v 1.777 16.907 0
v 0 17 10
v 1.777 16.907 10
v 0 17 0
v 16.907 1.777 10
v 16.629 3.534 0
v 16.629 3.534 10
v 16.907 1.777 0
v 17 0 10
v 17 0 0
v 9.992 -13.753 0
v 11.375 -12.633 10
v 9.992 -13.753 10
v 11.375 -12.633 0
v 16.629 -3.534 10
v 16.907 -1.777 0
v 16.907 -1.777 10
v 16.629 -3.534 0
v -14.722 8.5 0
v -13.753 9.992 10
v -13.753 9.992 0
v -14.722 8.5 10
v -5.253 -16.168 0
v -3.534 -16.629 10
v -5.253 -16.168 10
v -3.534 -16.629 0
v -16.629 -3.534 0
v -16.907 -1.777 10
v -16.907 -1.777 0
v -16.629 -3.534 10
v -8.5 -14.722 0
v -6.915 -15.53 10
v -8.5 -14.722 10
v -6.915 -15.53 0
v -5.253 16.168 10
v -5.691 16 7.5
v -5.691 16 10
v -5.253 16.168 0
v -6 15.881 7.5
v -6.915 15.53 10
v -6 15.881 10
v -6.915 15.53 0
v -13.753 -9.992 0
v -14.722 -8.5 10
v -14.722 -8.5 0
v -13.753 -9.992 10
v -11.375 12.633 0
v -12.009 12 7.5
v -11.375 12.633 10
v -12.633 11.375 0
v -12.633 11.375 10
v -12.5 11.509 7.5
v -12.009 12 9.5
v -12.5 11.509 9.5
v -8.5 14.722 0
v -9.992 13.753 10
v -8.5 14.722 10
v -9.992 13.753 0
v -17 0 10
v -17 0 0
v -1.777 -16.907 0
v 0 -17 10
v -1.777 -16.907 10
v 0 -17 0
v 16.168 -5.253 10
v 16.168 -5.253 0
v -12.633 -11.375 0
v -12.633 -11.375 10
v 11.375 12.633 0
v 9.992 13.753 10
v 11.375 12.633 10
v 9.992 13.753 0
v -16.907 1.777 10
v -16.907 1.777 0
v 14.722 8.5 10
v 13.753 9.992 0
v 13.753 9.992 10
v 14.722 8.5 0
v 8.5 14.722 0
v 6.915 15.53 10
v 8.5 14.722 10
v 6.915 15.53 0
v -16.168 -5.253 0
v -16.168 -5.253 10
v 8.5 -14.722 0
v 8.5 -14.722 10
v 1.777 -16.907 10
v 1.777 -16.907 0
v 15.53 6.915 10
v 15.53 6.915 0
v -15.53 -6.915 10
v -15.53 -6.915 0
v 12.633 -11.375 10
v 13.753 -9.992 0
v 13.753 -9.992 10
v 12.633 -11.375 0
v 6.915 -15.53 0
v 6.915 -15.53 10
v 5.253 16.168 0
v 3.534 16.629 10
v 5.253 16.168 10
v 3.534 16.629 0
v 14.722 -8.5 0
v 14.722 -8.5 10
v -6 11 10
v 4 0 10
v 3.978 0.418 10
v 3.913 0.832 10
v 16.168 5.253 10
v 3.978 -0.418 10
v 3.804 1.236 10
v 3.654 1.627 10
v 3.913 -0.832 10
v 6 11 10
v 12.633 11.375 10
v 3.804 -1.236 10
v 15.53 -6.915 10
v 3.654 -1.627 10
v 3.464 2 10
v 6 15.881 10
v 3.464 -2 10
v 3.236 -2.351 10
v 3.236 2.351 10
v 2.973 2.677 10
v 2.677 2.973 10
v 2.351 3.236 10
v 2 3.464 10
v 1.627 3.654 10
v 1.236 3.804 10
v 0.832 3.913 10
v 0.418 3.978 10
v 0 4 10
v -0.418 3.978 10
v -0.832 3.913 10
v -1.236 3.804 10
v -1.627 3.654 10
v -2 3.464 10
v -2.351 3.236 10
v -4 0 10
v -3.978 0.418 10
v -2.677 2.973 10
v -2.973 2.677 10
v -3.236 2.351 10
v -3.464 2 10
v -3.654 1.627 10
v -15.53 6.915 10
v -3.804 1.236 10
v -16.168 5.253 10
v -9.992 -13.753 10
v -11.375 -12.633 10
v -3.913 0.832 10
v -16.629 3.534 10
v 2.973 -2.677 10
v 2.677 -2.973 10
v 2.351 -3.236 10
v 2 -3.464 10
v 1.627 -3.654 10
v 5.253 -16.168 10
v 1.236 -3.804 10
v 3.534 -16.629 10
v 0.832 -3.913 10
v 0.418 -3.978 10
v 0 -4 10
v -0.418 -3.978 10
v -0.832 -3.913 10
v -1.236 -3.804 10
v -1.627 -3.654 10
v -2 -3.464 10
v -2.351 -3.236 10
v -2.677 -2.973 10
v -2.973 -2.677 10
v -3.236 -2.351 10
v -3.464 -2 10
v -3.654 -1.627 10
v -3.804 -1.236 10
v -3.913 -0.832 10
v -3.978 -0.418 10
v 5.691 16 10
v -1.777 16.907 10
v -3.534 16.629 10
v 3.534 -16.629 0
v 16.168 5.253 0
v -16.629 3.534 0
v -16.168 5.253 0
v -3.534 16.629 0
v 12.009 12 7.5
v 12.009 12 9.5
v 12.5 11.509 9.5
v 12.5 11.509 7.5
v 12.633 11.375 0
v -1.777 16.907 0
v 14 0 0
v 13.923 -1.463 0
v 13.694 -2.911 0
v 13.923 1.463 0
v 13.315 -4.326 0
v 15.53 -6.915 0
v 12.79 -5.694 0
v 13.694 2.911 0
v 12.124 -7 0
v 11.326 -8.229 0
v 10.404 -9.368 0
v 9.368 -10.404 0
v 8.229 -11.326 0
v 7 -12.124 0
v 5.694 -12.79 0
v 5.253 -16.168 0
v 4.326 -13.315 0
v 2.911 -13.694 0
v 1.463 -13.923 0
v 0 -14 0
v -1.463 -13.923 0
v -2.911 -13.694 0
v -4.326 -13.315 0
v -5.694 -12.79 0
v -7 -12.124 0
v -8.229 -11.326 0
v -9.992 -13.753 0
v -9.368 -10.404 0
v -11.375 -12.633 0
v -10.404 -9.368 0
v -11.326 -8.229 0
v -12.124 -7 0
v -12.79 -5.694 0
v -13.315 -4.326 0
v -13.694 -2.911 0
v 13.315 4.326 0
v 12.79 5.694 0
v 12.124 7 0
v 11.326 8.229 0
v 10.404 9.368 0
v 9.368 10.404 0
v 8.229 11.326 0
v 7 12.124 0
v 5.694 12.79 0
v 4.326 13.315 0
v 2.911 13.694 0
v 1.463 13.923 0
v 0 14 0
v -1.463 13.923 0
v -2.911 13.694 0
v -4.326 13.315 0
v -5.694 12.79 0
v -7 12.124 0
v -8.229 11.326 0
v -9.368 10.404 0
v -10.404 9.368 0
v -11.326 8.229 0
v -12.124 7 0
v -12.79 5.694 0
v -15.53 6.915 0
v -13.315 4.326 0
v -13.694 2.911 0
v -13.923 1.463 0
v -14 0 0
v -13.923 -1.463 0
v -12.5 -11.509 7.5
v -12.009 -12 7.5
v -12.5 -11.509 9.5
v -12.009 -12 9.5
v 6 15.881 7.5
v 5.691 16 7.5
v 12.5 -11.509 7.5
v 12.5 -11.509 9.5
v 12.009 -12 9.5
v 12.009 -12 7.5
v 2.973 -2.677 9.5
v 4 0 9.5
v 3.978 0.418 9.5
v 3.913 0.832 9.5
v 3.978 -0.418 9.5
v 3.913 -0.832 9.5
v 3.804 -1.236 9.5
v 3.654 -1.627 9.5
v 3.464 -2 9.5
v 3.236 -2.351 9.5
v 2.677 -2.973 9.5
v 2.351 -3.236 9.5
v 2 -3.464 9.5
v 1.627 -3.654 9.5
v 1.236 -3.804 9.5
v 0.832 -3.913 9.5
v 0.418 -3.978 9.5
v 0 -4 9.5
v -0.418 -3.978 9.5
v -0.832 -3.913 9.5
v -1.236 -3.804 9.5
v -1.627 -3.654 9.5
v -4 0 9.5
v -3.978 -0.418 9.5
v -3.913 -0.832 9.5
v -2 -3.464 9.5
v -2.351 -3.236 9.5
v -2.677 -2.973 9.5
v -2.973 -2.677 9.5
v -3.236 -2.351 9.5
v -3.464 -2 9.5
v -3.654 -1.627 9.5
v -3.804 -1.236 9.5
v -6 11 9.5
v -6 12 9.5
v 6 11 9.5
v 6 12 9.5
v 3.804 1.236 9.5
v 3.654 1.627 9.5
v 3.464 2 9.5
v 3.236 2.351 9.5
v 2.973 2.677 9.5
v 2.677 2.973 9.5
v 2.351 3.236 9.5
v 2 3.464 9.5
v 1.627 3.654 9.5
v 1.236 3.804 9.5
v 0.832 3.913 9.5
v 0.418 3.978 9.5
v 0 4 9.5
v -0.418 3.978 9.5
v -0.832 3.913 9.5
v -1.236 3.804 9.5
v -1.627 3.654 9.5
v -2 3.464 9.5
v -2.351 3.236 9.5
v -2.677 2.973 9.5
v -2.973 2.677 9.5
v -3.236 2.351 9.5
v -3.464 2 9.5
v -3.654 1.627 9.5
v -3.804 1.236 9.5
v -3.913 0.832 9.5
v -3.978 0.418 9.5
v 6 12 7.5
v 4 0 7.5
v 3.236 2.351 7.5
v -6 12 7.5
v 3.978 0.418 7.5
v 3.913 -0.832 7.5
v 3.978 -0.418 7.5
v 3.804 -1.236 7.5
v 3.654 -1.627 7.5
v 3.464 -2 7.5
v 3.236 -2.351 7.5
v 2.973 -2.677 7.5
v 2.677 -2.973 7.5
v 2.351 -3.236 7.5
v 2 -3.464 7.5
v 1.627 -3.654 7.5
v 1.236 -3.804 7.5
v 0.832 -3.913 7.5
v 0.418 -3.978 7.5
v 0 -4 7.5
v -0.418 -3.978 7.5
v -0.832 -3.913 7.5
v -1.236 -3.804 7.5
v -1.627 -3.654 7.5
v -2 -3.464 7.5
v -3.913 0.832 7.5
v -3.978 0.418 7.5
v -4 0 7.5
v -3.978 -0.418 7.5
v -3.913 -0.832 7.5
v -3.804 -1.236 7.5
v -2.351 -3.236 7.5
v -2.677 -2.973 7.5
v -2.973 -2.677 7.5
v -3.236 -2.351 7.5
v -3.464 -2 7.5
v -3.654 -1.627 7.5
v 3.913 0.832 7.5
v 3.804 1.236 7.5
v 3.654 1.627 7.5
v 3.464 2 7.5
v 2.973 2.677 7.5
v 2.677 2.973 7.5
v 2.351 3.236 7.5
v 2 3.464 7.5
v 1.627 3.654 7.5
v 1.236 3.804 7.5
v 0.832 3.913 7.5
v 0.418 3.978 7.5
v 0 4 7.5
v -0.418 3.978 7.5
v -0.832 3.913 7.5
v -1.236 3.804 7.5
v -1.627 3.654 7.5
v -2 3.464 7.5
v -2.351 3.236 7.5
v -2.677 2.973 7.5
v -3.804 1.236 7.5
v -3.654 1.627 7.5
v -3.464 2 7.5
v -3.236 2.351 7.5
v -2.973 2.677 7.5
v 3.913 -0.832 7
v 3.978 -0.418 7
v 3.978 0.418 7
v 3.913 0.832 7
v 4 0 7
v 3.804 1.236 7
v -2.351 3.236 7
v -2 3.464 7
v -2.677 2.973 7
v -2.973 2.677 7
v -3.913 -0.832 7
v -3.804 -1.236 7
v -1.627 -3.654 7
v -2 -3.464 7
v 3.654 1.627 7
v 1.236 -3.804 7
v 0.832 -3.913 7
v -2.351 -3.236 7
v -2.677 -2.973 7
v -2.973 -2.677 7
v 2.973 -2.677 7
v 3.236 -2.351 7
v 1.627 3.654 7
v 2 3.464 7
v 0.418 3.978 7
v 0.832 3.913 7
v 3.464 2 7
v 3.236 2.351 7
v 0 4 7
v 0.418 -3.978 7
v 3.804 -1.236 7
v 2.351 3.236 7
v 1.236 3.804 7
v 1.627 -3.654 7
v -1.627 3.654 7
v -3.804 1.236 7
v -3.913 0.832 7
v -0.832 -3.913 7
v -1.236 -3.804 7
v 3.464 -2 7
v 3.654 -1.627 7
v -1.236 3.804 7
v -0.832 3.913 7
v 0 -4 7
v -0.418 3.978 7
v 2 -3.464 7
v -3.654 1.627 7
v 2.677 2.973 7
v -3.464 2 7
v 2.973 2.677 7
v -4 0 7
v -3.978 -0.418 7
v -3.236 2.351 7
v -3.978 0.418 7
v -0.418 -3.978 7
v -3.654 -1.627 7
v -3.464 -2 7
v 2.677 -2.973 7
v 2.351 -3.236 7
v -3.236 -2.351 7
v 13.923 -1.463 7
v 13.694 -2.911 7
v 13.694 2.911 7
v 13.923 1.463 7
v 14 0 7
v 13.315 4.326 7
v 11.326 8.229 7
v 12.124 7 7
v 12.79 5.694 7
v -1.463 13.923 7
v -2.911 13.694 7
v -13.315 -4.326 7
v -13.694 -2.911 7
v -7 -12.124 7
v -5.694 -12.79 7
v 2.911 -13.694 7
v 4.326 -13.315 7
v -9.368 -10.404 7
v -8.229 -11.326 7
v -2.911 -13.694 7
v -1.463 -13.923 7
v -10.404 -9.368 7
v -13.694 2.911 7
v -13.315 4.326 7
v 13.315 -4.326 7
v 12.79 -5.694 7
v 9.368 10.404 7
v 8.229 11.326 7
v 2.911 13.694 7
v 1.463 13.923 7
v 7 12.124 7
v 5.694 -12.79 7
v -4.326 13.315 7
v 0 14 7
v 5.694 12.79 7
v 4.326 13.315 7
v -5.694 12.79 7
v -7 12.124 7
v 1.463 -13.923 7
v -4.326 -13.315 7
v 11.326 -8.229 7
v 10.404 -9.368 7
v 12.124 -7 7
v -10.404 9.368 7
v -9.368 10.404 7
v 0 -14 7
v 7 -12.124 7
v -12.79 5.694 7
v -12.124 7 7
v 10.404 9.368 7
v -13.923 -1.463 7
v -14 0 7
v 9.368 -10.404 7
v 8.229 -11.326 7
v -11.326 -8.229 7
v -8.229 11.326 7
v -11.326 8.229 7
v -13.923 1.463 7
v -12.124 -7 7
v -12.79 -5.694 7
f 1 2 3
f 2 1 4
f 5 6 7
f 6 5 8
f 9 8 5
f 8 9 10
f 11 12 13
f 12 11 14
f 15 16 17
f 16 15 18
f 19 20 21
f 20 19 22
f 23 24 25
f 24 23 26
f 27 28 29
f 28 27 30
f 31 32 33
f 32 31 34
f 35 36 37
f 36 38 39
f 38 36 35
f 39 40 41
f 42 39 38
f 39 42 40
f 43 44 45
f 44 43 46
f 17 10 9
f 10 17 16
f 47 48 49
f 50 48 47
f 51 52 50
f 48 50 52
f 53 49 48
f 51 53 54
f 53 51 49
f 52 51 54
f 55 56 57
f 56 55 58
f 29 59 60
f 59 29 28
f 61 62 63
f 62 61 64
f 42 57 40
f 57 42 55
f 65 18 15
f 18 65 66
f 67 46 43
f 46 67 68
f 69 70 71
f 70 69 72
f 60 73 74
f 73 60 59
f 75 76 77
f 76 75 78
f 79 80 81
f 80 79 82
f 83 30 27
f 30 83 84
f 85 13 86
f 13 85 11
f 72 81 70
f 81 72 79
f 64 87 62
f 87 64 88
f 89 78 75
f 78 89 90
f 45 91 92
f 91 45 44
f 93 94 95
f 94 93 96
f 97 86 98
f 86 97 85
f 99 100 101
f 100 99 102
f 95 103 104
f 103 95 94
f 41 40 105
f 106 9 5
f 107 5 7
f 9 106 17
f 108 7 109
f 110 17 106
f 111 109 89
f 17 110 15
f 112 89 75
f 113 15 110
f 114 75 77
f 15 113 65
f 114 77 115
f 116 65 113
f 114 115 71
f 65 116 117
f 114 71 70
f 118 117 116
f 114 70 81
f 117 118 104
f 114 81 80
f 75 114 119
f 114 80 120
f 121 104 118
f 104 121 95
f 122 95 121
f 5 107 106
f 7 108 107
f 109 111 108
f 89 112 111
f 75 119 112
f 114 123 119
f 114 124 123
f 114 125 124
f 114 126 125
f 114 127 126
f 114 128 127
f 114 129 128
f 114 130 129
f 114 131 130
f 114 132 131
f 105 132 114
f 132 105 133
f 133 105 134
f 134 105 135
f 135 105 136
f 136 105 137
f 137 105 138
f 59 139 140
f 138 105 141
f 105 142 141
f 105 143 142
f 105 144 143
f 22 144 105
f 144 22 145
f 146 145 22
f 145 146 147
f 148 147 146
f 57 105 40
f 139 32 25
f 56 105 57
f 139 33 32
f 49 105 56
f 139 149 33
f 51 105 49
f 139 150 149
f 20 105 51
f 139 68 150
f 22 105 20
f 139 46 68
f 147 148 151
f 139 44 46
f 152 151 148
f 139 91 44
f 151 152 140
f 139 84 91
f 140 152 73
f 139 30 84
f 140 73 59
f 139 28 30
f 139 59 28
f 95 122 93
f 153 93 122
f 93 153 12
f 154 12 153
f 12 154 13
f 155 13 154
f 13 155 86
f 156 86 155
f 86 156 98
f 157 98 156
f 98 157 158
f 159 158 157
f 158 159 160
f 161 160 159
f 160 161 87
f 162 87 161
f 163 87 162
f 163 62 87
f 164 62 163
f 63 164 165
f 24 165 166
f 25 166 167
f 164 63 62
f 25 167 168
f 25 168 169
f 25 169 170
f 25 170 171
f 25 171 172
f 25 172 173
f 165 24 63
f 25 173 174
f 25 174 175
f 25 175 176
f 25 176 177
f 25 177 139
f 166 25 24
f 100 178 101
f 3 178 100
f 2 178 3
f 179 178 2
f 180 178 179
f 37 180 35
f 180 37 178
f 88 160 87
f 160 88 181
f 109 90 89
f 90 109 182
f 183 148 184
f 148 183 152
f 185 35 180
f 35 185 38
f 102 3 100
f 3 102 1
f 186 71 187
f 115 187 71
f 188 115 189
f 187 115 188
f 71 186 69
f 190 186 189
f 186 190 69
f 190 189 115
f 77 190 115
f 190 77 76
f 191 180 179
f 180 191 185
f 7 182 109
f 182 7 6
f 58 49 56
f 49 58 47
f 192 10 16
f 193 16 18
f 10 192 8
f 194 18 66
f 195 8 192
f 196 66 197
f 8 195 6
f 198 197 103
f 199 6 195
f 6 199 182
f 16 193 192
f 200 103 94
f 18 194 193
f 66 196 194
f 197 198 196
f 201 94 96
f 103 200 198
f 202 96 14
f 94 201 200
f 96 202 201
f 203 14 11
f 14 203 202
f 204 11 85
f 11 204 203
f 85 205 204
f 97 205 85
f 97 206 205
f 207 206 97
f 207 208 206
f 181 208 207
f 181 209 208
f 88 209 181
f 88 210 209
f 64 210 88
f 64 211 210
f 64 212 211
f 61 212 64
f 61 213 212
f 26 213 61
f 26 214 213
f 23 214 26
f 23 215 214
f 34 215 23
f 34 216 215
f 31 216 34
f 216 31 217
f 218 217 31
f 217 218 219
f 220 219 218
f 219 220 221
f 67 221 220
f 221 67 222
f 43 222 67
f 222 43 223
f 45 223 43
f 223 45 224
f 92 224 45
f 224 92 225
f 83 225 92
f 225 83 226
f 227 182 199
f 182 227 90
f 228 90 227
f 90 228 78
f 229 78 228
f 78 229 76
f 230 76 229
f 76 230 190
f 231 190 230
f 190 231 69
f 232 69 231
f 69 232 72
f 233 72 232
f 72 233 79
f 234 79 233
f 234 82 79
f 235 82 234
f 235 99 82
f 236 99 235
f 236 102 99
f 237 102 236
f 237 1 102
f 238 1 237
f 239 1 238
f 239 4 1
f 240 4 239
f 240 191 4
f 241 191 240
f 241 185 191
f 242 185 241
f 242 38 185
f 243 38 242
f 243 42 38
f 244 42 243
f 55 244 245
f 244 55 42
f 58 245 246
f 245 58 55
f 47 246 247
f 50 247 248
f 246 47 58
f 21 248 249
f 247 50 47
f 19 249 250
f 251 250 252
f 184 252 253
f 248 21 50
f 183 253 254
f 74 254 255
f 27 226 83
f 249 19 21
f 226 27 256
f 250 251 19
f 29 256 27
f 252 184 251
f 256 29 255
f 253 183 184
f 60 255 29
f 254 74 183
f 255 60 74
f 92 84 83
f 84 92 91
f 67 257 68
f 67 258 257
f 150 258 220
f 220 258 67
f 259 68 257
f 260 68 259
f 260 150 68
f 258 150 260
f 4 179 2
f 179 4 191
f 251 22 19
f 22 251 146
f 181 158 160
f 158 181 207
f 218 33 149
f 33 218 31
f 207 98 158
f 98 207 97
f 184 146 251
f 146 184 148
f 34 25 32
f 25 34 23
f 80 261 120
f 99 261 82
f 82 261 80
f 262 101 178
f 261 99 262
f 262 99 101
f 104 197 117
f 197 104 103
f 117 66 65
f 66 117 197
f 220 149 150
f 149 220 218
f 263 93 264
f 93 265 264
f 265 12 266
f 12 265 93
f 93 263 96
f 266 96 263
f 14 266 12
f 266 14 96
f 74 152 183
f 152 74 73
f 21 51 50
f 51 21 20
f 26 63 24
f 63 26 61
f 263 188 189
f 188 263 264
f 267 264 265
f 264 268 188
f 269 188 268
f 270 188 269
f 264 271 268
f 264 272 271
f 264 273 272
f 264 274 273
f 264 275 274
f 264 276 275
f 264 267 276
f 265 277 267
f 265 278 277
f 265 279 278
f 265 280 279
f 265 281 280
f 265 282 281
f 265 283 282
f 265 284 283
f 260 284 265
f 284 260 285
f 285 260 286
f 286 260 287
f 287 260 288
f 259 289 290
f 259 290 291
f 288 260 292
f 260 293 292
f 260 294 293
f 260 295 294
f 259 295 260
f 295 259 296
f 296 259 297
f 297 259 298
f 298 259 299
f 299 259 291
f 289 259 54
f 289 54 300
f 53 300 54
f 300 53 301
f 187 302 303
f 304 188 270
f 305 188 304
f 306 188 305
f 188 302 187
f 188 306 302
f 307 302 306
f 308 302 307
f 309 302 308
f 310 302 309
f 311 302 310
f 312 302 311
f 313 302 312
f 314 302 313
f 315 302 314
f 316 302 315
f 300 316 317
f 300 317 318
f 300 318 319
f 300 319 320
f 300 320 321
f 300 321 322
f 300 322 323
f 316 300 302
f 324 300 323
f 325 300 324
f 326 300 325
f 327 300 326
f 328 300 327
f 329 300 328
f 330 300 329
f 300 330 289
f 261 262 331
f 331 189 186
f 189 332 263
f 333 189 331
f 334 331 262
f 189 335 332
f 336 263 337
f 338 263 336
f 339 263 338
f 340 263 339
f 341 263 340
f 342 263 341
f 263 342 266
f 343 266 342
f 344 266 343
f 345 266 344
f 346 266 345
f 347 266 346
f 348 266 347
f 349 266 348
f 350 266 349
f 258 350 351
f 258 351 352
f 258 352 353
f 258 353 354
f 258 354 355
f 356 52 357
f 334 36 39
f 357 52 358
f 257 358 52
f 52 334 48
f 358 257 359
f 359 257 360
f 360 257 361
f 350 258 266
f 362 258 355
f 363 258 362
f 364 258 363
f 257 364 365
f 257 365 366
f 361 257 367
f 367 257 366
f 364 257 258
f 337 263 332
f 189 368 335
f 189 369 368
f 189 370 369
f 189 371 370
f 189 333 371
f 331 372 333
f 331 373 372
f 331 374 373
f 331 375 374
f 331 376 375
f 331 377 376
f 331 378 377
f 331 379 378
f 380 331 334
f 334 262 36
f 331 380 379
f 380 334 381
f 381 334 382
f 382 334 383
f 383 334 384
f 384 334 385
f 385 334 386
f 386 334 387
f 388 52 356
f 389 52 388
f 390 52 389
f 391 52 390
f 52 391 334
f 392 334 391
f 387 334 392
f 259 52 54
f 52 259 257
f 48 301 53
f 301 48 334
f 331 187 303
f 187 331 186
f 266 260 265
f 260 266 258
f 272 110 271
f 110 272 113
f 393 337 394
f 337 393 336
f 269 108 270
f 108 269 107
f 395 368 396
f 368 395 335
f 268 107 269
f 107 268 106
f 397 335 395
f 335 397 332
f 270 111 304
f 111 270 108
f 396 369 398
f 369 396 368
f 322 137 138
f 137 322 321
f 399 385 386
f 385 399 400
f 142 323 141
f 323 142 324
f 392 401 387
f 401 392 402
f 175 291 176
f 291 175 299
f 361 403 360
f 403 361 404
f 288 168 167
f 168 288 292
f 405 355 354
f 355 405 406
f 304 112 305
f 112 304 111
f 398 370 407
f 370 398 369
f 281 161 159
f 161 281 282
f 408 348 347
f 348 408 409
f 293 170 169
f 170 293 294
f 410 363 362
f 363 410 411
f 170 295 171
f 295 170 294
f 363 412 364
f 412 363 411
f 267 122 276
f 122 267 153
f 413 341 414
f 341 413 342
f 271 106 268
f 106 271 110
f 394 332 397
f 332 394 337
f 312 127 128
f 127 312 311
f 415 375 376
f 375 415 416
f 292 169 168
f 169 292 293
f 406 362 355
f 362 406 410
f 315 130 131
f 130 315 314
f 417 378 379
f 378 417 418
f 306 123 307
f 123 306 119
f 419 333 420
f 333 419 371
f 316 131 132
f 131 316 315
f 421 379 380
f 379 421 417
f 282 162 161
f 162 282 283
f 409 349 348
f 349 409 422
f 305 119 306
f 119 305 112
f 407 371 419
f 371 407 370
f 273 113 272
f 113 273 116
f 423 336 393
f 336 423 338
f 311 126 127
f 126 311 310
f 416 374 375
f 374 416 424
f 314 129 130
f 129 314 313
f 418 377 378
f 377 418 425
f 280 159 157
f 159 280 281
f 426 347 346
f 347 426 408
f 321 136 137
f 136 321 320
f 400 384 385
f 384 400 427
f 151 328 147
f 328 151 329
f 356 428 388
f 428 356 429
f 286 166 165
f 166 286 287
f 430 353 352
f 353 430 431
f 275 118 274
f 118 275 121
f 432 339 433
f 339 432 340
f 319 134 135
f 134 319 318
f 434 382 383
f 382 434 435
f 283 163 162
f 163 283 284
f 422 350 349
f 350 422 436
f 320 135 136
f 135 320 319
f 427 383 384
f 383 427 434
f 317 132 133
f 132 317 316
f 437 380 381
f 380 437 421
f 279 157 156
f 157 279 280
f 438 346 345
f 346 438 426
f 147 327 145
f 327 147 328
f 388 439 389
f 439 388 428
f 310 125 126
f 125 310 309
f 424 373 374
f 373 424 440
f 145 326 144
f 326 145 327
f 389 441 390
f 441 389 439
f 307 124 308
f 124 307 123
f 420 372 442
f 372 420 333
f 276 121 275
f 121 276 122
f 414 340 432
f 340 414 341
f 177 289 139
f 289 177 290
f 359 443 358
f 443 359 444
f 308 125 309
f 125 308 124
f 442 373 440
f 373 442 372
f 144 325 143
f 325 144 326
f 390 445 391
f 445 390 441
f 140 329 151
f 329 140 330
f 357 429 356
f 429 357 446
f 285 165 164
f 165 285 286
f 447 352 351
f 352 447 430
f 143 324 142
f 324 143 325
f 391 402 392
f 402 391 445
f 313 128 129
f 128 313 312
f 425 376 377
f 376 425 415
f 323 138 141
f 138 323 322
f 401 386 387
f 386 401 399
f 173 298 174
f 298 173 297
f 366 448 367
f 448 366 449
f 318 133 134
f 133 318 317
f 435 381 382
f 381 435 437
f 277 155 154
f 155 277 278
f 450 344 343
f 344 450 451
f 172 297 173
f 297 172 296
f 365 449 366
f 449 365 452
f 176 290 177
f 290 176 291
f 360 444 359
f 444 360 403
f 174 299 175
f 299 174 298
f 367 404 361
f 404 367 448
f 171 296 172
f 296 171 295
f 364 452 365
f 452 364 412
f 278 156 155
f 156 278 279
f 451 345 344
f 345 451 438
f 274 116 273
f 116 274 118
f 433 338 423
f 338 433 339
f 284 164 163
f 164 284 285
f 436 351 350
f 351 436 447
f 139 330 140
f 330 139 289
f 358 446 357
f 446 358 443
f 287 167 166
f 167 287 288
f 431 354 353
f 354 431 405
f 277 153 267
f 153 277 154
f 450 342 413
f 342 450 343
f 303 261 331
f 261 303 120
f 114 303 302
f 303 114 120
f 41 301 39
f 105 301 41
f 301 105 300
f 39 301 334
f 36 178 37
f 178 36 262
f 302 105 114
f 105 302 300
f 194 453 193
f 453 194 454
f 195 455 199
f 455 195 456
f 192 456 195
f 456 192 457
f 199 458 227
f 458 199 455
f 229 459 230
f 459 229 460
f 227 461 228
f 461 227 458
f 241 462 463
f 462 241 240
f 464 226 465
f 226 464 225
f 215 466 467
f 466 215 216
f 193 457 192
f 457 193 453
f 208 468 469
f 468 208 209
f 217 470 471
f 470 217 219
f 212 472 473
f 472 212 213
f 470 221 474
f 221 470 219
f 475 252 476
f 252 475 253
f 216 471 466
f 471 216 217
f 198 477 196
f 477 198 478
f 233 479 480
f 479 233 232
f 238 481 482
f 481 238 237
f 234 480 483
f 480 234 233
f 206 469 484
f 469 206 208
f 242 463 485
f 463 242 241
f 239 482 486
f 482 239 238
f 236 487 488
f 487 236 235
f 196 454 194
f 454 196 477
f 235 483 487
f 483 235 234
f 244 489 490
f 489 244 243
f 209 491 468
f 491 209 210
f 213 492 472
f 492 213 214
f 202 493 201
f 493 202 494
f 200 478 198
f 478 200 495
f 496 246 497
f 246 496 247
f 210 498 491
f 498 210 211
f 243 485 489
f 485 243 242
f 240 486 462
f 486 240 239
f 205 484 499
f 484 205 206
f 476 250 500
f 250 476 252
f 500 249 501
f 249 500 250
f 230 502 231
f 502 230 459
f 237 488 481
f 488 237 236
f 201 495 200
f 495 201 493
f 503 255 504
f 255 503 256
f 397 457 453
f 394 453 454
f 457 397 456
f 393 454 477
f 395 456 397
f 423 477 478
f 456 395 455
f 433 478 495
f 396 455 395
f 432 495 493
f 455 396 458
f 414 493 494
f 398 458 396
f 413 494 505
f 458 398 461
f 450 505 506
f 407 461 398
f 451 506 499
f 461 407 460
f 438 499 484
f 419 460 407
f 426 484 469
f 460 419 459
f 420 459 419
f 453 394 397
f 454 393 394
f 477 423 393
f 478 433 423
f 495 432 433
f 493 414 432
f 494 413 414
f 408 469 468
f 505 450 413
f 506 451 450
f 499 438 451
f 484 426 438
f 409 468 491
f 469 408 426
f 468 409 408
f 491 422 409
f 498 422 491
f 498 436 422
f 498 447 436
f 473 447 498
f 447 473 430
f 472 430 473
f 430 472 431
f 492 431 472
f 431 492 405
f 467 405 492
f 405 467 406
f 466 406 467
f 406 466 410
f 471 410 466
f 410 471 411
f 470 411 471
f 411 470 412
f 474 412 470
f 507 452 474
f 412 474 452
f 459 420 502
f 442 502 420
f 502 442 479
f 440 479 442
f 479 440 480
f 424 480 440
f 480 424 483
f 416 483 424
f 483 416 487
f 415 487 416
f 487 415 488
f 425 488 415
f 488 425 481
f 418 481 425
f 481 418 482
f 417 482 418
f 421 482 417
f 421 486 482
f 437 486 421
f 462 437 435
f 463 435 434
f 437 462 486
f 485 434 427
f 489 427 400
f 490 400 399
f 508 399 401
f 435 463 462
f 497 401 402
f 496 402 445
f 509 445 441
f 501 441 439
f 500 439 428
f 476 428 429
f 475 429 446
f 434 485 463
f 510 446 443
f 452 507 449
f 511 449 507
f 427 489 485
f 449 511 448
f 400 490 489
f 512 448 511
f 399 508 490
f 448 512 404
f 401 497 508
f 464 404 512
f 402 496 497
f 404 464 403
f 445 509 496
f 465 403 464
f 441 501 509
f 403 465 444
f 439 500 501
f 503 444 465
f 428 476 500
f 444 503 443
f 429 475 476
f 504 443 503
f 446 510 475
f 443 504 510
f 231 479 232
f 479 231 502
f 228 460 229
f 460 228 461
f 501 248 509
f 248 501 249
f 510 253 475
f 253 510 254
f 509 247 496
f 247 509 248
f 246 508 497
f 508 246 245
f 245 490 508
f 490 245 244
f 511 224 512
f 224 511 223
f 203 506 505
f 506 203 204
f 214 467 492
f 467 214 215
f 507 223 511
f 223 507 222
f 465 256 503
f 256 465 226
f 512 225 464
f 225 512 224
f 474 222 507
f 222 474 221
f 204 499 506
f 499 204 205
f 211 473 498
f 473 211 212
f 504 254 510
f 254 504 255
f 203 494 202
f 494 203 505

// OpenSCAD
// eye_socket_camera_mount.scad
//
// A snap-fit ring that holds a Raspberry Pi Camera Module (v2/v3) inside
// one eye socket, angled slightly downward toward visitors. The other eye
// socket uses eye_led_diffuser.scad instead — this build uses ONE eye for
// the camera and ONE for the LED, since both don't fit in most skull eye
// sockets side by side.
//
// PRINT SETTINGS: PLA, 15% infill. Print with the flat face down; the
// downward camera-angle tilt is applied by how you glue this into the
// socket, not by the print geometry, so orientation during printing is
// simple.

cam_board_w   = 25.0;  // Camera Module PCB is ~25x24mm for v2/v3
cam_board_h   = 24.0;
cam_board_thick = 1.5;
cam_lens_d    = 8.0;   // clearance hole for the lens housing

socket_od     = 34.0;  // adjust to your skeleton's actual eye socket diameter
ring_thick    = 3.0;
ring_depth    = 10.0;

$fn = 60;

module camera_pocket() {
    translate([-cam_board_w/2, -cam_board_h/2, 0])
        cube([cam_board_w, cam_board_h, cam_board_thick + 0.5]);
}

module lens_hole() {
    translate([0, 0, -1])
        cylinder(h = ring_depth + 2, d = cam_lens_d);
}

module ribbon_slot() {
    // Slot for the CSI ribbon cable to exit toward the back of the skull.
    translate([-6, cam_board_h/2 - 1, 0])
        cube([12, ring_thick + 2, cam_board_thick + 1]);
}

difference() {
    cylinder(h = ring_depth, d = socket_od);
    translate([0, 0, ring_depth - cam_board_thick - 1])
        camera_pocket();
    lens_hole();
    translate([0, 0, ring_depth - cam_board_thick - 1])
        ribbon_slot();
    // hollow the center so the ring is a thin shell, not a solid disc
    translate([0, 0, -1])
        cylinder(h = ring_depth - cam_board_thick - 0.5, d = socket_od - ring_thick*2);
}
